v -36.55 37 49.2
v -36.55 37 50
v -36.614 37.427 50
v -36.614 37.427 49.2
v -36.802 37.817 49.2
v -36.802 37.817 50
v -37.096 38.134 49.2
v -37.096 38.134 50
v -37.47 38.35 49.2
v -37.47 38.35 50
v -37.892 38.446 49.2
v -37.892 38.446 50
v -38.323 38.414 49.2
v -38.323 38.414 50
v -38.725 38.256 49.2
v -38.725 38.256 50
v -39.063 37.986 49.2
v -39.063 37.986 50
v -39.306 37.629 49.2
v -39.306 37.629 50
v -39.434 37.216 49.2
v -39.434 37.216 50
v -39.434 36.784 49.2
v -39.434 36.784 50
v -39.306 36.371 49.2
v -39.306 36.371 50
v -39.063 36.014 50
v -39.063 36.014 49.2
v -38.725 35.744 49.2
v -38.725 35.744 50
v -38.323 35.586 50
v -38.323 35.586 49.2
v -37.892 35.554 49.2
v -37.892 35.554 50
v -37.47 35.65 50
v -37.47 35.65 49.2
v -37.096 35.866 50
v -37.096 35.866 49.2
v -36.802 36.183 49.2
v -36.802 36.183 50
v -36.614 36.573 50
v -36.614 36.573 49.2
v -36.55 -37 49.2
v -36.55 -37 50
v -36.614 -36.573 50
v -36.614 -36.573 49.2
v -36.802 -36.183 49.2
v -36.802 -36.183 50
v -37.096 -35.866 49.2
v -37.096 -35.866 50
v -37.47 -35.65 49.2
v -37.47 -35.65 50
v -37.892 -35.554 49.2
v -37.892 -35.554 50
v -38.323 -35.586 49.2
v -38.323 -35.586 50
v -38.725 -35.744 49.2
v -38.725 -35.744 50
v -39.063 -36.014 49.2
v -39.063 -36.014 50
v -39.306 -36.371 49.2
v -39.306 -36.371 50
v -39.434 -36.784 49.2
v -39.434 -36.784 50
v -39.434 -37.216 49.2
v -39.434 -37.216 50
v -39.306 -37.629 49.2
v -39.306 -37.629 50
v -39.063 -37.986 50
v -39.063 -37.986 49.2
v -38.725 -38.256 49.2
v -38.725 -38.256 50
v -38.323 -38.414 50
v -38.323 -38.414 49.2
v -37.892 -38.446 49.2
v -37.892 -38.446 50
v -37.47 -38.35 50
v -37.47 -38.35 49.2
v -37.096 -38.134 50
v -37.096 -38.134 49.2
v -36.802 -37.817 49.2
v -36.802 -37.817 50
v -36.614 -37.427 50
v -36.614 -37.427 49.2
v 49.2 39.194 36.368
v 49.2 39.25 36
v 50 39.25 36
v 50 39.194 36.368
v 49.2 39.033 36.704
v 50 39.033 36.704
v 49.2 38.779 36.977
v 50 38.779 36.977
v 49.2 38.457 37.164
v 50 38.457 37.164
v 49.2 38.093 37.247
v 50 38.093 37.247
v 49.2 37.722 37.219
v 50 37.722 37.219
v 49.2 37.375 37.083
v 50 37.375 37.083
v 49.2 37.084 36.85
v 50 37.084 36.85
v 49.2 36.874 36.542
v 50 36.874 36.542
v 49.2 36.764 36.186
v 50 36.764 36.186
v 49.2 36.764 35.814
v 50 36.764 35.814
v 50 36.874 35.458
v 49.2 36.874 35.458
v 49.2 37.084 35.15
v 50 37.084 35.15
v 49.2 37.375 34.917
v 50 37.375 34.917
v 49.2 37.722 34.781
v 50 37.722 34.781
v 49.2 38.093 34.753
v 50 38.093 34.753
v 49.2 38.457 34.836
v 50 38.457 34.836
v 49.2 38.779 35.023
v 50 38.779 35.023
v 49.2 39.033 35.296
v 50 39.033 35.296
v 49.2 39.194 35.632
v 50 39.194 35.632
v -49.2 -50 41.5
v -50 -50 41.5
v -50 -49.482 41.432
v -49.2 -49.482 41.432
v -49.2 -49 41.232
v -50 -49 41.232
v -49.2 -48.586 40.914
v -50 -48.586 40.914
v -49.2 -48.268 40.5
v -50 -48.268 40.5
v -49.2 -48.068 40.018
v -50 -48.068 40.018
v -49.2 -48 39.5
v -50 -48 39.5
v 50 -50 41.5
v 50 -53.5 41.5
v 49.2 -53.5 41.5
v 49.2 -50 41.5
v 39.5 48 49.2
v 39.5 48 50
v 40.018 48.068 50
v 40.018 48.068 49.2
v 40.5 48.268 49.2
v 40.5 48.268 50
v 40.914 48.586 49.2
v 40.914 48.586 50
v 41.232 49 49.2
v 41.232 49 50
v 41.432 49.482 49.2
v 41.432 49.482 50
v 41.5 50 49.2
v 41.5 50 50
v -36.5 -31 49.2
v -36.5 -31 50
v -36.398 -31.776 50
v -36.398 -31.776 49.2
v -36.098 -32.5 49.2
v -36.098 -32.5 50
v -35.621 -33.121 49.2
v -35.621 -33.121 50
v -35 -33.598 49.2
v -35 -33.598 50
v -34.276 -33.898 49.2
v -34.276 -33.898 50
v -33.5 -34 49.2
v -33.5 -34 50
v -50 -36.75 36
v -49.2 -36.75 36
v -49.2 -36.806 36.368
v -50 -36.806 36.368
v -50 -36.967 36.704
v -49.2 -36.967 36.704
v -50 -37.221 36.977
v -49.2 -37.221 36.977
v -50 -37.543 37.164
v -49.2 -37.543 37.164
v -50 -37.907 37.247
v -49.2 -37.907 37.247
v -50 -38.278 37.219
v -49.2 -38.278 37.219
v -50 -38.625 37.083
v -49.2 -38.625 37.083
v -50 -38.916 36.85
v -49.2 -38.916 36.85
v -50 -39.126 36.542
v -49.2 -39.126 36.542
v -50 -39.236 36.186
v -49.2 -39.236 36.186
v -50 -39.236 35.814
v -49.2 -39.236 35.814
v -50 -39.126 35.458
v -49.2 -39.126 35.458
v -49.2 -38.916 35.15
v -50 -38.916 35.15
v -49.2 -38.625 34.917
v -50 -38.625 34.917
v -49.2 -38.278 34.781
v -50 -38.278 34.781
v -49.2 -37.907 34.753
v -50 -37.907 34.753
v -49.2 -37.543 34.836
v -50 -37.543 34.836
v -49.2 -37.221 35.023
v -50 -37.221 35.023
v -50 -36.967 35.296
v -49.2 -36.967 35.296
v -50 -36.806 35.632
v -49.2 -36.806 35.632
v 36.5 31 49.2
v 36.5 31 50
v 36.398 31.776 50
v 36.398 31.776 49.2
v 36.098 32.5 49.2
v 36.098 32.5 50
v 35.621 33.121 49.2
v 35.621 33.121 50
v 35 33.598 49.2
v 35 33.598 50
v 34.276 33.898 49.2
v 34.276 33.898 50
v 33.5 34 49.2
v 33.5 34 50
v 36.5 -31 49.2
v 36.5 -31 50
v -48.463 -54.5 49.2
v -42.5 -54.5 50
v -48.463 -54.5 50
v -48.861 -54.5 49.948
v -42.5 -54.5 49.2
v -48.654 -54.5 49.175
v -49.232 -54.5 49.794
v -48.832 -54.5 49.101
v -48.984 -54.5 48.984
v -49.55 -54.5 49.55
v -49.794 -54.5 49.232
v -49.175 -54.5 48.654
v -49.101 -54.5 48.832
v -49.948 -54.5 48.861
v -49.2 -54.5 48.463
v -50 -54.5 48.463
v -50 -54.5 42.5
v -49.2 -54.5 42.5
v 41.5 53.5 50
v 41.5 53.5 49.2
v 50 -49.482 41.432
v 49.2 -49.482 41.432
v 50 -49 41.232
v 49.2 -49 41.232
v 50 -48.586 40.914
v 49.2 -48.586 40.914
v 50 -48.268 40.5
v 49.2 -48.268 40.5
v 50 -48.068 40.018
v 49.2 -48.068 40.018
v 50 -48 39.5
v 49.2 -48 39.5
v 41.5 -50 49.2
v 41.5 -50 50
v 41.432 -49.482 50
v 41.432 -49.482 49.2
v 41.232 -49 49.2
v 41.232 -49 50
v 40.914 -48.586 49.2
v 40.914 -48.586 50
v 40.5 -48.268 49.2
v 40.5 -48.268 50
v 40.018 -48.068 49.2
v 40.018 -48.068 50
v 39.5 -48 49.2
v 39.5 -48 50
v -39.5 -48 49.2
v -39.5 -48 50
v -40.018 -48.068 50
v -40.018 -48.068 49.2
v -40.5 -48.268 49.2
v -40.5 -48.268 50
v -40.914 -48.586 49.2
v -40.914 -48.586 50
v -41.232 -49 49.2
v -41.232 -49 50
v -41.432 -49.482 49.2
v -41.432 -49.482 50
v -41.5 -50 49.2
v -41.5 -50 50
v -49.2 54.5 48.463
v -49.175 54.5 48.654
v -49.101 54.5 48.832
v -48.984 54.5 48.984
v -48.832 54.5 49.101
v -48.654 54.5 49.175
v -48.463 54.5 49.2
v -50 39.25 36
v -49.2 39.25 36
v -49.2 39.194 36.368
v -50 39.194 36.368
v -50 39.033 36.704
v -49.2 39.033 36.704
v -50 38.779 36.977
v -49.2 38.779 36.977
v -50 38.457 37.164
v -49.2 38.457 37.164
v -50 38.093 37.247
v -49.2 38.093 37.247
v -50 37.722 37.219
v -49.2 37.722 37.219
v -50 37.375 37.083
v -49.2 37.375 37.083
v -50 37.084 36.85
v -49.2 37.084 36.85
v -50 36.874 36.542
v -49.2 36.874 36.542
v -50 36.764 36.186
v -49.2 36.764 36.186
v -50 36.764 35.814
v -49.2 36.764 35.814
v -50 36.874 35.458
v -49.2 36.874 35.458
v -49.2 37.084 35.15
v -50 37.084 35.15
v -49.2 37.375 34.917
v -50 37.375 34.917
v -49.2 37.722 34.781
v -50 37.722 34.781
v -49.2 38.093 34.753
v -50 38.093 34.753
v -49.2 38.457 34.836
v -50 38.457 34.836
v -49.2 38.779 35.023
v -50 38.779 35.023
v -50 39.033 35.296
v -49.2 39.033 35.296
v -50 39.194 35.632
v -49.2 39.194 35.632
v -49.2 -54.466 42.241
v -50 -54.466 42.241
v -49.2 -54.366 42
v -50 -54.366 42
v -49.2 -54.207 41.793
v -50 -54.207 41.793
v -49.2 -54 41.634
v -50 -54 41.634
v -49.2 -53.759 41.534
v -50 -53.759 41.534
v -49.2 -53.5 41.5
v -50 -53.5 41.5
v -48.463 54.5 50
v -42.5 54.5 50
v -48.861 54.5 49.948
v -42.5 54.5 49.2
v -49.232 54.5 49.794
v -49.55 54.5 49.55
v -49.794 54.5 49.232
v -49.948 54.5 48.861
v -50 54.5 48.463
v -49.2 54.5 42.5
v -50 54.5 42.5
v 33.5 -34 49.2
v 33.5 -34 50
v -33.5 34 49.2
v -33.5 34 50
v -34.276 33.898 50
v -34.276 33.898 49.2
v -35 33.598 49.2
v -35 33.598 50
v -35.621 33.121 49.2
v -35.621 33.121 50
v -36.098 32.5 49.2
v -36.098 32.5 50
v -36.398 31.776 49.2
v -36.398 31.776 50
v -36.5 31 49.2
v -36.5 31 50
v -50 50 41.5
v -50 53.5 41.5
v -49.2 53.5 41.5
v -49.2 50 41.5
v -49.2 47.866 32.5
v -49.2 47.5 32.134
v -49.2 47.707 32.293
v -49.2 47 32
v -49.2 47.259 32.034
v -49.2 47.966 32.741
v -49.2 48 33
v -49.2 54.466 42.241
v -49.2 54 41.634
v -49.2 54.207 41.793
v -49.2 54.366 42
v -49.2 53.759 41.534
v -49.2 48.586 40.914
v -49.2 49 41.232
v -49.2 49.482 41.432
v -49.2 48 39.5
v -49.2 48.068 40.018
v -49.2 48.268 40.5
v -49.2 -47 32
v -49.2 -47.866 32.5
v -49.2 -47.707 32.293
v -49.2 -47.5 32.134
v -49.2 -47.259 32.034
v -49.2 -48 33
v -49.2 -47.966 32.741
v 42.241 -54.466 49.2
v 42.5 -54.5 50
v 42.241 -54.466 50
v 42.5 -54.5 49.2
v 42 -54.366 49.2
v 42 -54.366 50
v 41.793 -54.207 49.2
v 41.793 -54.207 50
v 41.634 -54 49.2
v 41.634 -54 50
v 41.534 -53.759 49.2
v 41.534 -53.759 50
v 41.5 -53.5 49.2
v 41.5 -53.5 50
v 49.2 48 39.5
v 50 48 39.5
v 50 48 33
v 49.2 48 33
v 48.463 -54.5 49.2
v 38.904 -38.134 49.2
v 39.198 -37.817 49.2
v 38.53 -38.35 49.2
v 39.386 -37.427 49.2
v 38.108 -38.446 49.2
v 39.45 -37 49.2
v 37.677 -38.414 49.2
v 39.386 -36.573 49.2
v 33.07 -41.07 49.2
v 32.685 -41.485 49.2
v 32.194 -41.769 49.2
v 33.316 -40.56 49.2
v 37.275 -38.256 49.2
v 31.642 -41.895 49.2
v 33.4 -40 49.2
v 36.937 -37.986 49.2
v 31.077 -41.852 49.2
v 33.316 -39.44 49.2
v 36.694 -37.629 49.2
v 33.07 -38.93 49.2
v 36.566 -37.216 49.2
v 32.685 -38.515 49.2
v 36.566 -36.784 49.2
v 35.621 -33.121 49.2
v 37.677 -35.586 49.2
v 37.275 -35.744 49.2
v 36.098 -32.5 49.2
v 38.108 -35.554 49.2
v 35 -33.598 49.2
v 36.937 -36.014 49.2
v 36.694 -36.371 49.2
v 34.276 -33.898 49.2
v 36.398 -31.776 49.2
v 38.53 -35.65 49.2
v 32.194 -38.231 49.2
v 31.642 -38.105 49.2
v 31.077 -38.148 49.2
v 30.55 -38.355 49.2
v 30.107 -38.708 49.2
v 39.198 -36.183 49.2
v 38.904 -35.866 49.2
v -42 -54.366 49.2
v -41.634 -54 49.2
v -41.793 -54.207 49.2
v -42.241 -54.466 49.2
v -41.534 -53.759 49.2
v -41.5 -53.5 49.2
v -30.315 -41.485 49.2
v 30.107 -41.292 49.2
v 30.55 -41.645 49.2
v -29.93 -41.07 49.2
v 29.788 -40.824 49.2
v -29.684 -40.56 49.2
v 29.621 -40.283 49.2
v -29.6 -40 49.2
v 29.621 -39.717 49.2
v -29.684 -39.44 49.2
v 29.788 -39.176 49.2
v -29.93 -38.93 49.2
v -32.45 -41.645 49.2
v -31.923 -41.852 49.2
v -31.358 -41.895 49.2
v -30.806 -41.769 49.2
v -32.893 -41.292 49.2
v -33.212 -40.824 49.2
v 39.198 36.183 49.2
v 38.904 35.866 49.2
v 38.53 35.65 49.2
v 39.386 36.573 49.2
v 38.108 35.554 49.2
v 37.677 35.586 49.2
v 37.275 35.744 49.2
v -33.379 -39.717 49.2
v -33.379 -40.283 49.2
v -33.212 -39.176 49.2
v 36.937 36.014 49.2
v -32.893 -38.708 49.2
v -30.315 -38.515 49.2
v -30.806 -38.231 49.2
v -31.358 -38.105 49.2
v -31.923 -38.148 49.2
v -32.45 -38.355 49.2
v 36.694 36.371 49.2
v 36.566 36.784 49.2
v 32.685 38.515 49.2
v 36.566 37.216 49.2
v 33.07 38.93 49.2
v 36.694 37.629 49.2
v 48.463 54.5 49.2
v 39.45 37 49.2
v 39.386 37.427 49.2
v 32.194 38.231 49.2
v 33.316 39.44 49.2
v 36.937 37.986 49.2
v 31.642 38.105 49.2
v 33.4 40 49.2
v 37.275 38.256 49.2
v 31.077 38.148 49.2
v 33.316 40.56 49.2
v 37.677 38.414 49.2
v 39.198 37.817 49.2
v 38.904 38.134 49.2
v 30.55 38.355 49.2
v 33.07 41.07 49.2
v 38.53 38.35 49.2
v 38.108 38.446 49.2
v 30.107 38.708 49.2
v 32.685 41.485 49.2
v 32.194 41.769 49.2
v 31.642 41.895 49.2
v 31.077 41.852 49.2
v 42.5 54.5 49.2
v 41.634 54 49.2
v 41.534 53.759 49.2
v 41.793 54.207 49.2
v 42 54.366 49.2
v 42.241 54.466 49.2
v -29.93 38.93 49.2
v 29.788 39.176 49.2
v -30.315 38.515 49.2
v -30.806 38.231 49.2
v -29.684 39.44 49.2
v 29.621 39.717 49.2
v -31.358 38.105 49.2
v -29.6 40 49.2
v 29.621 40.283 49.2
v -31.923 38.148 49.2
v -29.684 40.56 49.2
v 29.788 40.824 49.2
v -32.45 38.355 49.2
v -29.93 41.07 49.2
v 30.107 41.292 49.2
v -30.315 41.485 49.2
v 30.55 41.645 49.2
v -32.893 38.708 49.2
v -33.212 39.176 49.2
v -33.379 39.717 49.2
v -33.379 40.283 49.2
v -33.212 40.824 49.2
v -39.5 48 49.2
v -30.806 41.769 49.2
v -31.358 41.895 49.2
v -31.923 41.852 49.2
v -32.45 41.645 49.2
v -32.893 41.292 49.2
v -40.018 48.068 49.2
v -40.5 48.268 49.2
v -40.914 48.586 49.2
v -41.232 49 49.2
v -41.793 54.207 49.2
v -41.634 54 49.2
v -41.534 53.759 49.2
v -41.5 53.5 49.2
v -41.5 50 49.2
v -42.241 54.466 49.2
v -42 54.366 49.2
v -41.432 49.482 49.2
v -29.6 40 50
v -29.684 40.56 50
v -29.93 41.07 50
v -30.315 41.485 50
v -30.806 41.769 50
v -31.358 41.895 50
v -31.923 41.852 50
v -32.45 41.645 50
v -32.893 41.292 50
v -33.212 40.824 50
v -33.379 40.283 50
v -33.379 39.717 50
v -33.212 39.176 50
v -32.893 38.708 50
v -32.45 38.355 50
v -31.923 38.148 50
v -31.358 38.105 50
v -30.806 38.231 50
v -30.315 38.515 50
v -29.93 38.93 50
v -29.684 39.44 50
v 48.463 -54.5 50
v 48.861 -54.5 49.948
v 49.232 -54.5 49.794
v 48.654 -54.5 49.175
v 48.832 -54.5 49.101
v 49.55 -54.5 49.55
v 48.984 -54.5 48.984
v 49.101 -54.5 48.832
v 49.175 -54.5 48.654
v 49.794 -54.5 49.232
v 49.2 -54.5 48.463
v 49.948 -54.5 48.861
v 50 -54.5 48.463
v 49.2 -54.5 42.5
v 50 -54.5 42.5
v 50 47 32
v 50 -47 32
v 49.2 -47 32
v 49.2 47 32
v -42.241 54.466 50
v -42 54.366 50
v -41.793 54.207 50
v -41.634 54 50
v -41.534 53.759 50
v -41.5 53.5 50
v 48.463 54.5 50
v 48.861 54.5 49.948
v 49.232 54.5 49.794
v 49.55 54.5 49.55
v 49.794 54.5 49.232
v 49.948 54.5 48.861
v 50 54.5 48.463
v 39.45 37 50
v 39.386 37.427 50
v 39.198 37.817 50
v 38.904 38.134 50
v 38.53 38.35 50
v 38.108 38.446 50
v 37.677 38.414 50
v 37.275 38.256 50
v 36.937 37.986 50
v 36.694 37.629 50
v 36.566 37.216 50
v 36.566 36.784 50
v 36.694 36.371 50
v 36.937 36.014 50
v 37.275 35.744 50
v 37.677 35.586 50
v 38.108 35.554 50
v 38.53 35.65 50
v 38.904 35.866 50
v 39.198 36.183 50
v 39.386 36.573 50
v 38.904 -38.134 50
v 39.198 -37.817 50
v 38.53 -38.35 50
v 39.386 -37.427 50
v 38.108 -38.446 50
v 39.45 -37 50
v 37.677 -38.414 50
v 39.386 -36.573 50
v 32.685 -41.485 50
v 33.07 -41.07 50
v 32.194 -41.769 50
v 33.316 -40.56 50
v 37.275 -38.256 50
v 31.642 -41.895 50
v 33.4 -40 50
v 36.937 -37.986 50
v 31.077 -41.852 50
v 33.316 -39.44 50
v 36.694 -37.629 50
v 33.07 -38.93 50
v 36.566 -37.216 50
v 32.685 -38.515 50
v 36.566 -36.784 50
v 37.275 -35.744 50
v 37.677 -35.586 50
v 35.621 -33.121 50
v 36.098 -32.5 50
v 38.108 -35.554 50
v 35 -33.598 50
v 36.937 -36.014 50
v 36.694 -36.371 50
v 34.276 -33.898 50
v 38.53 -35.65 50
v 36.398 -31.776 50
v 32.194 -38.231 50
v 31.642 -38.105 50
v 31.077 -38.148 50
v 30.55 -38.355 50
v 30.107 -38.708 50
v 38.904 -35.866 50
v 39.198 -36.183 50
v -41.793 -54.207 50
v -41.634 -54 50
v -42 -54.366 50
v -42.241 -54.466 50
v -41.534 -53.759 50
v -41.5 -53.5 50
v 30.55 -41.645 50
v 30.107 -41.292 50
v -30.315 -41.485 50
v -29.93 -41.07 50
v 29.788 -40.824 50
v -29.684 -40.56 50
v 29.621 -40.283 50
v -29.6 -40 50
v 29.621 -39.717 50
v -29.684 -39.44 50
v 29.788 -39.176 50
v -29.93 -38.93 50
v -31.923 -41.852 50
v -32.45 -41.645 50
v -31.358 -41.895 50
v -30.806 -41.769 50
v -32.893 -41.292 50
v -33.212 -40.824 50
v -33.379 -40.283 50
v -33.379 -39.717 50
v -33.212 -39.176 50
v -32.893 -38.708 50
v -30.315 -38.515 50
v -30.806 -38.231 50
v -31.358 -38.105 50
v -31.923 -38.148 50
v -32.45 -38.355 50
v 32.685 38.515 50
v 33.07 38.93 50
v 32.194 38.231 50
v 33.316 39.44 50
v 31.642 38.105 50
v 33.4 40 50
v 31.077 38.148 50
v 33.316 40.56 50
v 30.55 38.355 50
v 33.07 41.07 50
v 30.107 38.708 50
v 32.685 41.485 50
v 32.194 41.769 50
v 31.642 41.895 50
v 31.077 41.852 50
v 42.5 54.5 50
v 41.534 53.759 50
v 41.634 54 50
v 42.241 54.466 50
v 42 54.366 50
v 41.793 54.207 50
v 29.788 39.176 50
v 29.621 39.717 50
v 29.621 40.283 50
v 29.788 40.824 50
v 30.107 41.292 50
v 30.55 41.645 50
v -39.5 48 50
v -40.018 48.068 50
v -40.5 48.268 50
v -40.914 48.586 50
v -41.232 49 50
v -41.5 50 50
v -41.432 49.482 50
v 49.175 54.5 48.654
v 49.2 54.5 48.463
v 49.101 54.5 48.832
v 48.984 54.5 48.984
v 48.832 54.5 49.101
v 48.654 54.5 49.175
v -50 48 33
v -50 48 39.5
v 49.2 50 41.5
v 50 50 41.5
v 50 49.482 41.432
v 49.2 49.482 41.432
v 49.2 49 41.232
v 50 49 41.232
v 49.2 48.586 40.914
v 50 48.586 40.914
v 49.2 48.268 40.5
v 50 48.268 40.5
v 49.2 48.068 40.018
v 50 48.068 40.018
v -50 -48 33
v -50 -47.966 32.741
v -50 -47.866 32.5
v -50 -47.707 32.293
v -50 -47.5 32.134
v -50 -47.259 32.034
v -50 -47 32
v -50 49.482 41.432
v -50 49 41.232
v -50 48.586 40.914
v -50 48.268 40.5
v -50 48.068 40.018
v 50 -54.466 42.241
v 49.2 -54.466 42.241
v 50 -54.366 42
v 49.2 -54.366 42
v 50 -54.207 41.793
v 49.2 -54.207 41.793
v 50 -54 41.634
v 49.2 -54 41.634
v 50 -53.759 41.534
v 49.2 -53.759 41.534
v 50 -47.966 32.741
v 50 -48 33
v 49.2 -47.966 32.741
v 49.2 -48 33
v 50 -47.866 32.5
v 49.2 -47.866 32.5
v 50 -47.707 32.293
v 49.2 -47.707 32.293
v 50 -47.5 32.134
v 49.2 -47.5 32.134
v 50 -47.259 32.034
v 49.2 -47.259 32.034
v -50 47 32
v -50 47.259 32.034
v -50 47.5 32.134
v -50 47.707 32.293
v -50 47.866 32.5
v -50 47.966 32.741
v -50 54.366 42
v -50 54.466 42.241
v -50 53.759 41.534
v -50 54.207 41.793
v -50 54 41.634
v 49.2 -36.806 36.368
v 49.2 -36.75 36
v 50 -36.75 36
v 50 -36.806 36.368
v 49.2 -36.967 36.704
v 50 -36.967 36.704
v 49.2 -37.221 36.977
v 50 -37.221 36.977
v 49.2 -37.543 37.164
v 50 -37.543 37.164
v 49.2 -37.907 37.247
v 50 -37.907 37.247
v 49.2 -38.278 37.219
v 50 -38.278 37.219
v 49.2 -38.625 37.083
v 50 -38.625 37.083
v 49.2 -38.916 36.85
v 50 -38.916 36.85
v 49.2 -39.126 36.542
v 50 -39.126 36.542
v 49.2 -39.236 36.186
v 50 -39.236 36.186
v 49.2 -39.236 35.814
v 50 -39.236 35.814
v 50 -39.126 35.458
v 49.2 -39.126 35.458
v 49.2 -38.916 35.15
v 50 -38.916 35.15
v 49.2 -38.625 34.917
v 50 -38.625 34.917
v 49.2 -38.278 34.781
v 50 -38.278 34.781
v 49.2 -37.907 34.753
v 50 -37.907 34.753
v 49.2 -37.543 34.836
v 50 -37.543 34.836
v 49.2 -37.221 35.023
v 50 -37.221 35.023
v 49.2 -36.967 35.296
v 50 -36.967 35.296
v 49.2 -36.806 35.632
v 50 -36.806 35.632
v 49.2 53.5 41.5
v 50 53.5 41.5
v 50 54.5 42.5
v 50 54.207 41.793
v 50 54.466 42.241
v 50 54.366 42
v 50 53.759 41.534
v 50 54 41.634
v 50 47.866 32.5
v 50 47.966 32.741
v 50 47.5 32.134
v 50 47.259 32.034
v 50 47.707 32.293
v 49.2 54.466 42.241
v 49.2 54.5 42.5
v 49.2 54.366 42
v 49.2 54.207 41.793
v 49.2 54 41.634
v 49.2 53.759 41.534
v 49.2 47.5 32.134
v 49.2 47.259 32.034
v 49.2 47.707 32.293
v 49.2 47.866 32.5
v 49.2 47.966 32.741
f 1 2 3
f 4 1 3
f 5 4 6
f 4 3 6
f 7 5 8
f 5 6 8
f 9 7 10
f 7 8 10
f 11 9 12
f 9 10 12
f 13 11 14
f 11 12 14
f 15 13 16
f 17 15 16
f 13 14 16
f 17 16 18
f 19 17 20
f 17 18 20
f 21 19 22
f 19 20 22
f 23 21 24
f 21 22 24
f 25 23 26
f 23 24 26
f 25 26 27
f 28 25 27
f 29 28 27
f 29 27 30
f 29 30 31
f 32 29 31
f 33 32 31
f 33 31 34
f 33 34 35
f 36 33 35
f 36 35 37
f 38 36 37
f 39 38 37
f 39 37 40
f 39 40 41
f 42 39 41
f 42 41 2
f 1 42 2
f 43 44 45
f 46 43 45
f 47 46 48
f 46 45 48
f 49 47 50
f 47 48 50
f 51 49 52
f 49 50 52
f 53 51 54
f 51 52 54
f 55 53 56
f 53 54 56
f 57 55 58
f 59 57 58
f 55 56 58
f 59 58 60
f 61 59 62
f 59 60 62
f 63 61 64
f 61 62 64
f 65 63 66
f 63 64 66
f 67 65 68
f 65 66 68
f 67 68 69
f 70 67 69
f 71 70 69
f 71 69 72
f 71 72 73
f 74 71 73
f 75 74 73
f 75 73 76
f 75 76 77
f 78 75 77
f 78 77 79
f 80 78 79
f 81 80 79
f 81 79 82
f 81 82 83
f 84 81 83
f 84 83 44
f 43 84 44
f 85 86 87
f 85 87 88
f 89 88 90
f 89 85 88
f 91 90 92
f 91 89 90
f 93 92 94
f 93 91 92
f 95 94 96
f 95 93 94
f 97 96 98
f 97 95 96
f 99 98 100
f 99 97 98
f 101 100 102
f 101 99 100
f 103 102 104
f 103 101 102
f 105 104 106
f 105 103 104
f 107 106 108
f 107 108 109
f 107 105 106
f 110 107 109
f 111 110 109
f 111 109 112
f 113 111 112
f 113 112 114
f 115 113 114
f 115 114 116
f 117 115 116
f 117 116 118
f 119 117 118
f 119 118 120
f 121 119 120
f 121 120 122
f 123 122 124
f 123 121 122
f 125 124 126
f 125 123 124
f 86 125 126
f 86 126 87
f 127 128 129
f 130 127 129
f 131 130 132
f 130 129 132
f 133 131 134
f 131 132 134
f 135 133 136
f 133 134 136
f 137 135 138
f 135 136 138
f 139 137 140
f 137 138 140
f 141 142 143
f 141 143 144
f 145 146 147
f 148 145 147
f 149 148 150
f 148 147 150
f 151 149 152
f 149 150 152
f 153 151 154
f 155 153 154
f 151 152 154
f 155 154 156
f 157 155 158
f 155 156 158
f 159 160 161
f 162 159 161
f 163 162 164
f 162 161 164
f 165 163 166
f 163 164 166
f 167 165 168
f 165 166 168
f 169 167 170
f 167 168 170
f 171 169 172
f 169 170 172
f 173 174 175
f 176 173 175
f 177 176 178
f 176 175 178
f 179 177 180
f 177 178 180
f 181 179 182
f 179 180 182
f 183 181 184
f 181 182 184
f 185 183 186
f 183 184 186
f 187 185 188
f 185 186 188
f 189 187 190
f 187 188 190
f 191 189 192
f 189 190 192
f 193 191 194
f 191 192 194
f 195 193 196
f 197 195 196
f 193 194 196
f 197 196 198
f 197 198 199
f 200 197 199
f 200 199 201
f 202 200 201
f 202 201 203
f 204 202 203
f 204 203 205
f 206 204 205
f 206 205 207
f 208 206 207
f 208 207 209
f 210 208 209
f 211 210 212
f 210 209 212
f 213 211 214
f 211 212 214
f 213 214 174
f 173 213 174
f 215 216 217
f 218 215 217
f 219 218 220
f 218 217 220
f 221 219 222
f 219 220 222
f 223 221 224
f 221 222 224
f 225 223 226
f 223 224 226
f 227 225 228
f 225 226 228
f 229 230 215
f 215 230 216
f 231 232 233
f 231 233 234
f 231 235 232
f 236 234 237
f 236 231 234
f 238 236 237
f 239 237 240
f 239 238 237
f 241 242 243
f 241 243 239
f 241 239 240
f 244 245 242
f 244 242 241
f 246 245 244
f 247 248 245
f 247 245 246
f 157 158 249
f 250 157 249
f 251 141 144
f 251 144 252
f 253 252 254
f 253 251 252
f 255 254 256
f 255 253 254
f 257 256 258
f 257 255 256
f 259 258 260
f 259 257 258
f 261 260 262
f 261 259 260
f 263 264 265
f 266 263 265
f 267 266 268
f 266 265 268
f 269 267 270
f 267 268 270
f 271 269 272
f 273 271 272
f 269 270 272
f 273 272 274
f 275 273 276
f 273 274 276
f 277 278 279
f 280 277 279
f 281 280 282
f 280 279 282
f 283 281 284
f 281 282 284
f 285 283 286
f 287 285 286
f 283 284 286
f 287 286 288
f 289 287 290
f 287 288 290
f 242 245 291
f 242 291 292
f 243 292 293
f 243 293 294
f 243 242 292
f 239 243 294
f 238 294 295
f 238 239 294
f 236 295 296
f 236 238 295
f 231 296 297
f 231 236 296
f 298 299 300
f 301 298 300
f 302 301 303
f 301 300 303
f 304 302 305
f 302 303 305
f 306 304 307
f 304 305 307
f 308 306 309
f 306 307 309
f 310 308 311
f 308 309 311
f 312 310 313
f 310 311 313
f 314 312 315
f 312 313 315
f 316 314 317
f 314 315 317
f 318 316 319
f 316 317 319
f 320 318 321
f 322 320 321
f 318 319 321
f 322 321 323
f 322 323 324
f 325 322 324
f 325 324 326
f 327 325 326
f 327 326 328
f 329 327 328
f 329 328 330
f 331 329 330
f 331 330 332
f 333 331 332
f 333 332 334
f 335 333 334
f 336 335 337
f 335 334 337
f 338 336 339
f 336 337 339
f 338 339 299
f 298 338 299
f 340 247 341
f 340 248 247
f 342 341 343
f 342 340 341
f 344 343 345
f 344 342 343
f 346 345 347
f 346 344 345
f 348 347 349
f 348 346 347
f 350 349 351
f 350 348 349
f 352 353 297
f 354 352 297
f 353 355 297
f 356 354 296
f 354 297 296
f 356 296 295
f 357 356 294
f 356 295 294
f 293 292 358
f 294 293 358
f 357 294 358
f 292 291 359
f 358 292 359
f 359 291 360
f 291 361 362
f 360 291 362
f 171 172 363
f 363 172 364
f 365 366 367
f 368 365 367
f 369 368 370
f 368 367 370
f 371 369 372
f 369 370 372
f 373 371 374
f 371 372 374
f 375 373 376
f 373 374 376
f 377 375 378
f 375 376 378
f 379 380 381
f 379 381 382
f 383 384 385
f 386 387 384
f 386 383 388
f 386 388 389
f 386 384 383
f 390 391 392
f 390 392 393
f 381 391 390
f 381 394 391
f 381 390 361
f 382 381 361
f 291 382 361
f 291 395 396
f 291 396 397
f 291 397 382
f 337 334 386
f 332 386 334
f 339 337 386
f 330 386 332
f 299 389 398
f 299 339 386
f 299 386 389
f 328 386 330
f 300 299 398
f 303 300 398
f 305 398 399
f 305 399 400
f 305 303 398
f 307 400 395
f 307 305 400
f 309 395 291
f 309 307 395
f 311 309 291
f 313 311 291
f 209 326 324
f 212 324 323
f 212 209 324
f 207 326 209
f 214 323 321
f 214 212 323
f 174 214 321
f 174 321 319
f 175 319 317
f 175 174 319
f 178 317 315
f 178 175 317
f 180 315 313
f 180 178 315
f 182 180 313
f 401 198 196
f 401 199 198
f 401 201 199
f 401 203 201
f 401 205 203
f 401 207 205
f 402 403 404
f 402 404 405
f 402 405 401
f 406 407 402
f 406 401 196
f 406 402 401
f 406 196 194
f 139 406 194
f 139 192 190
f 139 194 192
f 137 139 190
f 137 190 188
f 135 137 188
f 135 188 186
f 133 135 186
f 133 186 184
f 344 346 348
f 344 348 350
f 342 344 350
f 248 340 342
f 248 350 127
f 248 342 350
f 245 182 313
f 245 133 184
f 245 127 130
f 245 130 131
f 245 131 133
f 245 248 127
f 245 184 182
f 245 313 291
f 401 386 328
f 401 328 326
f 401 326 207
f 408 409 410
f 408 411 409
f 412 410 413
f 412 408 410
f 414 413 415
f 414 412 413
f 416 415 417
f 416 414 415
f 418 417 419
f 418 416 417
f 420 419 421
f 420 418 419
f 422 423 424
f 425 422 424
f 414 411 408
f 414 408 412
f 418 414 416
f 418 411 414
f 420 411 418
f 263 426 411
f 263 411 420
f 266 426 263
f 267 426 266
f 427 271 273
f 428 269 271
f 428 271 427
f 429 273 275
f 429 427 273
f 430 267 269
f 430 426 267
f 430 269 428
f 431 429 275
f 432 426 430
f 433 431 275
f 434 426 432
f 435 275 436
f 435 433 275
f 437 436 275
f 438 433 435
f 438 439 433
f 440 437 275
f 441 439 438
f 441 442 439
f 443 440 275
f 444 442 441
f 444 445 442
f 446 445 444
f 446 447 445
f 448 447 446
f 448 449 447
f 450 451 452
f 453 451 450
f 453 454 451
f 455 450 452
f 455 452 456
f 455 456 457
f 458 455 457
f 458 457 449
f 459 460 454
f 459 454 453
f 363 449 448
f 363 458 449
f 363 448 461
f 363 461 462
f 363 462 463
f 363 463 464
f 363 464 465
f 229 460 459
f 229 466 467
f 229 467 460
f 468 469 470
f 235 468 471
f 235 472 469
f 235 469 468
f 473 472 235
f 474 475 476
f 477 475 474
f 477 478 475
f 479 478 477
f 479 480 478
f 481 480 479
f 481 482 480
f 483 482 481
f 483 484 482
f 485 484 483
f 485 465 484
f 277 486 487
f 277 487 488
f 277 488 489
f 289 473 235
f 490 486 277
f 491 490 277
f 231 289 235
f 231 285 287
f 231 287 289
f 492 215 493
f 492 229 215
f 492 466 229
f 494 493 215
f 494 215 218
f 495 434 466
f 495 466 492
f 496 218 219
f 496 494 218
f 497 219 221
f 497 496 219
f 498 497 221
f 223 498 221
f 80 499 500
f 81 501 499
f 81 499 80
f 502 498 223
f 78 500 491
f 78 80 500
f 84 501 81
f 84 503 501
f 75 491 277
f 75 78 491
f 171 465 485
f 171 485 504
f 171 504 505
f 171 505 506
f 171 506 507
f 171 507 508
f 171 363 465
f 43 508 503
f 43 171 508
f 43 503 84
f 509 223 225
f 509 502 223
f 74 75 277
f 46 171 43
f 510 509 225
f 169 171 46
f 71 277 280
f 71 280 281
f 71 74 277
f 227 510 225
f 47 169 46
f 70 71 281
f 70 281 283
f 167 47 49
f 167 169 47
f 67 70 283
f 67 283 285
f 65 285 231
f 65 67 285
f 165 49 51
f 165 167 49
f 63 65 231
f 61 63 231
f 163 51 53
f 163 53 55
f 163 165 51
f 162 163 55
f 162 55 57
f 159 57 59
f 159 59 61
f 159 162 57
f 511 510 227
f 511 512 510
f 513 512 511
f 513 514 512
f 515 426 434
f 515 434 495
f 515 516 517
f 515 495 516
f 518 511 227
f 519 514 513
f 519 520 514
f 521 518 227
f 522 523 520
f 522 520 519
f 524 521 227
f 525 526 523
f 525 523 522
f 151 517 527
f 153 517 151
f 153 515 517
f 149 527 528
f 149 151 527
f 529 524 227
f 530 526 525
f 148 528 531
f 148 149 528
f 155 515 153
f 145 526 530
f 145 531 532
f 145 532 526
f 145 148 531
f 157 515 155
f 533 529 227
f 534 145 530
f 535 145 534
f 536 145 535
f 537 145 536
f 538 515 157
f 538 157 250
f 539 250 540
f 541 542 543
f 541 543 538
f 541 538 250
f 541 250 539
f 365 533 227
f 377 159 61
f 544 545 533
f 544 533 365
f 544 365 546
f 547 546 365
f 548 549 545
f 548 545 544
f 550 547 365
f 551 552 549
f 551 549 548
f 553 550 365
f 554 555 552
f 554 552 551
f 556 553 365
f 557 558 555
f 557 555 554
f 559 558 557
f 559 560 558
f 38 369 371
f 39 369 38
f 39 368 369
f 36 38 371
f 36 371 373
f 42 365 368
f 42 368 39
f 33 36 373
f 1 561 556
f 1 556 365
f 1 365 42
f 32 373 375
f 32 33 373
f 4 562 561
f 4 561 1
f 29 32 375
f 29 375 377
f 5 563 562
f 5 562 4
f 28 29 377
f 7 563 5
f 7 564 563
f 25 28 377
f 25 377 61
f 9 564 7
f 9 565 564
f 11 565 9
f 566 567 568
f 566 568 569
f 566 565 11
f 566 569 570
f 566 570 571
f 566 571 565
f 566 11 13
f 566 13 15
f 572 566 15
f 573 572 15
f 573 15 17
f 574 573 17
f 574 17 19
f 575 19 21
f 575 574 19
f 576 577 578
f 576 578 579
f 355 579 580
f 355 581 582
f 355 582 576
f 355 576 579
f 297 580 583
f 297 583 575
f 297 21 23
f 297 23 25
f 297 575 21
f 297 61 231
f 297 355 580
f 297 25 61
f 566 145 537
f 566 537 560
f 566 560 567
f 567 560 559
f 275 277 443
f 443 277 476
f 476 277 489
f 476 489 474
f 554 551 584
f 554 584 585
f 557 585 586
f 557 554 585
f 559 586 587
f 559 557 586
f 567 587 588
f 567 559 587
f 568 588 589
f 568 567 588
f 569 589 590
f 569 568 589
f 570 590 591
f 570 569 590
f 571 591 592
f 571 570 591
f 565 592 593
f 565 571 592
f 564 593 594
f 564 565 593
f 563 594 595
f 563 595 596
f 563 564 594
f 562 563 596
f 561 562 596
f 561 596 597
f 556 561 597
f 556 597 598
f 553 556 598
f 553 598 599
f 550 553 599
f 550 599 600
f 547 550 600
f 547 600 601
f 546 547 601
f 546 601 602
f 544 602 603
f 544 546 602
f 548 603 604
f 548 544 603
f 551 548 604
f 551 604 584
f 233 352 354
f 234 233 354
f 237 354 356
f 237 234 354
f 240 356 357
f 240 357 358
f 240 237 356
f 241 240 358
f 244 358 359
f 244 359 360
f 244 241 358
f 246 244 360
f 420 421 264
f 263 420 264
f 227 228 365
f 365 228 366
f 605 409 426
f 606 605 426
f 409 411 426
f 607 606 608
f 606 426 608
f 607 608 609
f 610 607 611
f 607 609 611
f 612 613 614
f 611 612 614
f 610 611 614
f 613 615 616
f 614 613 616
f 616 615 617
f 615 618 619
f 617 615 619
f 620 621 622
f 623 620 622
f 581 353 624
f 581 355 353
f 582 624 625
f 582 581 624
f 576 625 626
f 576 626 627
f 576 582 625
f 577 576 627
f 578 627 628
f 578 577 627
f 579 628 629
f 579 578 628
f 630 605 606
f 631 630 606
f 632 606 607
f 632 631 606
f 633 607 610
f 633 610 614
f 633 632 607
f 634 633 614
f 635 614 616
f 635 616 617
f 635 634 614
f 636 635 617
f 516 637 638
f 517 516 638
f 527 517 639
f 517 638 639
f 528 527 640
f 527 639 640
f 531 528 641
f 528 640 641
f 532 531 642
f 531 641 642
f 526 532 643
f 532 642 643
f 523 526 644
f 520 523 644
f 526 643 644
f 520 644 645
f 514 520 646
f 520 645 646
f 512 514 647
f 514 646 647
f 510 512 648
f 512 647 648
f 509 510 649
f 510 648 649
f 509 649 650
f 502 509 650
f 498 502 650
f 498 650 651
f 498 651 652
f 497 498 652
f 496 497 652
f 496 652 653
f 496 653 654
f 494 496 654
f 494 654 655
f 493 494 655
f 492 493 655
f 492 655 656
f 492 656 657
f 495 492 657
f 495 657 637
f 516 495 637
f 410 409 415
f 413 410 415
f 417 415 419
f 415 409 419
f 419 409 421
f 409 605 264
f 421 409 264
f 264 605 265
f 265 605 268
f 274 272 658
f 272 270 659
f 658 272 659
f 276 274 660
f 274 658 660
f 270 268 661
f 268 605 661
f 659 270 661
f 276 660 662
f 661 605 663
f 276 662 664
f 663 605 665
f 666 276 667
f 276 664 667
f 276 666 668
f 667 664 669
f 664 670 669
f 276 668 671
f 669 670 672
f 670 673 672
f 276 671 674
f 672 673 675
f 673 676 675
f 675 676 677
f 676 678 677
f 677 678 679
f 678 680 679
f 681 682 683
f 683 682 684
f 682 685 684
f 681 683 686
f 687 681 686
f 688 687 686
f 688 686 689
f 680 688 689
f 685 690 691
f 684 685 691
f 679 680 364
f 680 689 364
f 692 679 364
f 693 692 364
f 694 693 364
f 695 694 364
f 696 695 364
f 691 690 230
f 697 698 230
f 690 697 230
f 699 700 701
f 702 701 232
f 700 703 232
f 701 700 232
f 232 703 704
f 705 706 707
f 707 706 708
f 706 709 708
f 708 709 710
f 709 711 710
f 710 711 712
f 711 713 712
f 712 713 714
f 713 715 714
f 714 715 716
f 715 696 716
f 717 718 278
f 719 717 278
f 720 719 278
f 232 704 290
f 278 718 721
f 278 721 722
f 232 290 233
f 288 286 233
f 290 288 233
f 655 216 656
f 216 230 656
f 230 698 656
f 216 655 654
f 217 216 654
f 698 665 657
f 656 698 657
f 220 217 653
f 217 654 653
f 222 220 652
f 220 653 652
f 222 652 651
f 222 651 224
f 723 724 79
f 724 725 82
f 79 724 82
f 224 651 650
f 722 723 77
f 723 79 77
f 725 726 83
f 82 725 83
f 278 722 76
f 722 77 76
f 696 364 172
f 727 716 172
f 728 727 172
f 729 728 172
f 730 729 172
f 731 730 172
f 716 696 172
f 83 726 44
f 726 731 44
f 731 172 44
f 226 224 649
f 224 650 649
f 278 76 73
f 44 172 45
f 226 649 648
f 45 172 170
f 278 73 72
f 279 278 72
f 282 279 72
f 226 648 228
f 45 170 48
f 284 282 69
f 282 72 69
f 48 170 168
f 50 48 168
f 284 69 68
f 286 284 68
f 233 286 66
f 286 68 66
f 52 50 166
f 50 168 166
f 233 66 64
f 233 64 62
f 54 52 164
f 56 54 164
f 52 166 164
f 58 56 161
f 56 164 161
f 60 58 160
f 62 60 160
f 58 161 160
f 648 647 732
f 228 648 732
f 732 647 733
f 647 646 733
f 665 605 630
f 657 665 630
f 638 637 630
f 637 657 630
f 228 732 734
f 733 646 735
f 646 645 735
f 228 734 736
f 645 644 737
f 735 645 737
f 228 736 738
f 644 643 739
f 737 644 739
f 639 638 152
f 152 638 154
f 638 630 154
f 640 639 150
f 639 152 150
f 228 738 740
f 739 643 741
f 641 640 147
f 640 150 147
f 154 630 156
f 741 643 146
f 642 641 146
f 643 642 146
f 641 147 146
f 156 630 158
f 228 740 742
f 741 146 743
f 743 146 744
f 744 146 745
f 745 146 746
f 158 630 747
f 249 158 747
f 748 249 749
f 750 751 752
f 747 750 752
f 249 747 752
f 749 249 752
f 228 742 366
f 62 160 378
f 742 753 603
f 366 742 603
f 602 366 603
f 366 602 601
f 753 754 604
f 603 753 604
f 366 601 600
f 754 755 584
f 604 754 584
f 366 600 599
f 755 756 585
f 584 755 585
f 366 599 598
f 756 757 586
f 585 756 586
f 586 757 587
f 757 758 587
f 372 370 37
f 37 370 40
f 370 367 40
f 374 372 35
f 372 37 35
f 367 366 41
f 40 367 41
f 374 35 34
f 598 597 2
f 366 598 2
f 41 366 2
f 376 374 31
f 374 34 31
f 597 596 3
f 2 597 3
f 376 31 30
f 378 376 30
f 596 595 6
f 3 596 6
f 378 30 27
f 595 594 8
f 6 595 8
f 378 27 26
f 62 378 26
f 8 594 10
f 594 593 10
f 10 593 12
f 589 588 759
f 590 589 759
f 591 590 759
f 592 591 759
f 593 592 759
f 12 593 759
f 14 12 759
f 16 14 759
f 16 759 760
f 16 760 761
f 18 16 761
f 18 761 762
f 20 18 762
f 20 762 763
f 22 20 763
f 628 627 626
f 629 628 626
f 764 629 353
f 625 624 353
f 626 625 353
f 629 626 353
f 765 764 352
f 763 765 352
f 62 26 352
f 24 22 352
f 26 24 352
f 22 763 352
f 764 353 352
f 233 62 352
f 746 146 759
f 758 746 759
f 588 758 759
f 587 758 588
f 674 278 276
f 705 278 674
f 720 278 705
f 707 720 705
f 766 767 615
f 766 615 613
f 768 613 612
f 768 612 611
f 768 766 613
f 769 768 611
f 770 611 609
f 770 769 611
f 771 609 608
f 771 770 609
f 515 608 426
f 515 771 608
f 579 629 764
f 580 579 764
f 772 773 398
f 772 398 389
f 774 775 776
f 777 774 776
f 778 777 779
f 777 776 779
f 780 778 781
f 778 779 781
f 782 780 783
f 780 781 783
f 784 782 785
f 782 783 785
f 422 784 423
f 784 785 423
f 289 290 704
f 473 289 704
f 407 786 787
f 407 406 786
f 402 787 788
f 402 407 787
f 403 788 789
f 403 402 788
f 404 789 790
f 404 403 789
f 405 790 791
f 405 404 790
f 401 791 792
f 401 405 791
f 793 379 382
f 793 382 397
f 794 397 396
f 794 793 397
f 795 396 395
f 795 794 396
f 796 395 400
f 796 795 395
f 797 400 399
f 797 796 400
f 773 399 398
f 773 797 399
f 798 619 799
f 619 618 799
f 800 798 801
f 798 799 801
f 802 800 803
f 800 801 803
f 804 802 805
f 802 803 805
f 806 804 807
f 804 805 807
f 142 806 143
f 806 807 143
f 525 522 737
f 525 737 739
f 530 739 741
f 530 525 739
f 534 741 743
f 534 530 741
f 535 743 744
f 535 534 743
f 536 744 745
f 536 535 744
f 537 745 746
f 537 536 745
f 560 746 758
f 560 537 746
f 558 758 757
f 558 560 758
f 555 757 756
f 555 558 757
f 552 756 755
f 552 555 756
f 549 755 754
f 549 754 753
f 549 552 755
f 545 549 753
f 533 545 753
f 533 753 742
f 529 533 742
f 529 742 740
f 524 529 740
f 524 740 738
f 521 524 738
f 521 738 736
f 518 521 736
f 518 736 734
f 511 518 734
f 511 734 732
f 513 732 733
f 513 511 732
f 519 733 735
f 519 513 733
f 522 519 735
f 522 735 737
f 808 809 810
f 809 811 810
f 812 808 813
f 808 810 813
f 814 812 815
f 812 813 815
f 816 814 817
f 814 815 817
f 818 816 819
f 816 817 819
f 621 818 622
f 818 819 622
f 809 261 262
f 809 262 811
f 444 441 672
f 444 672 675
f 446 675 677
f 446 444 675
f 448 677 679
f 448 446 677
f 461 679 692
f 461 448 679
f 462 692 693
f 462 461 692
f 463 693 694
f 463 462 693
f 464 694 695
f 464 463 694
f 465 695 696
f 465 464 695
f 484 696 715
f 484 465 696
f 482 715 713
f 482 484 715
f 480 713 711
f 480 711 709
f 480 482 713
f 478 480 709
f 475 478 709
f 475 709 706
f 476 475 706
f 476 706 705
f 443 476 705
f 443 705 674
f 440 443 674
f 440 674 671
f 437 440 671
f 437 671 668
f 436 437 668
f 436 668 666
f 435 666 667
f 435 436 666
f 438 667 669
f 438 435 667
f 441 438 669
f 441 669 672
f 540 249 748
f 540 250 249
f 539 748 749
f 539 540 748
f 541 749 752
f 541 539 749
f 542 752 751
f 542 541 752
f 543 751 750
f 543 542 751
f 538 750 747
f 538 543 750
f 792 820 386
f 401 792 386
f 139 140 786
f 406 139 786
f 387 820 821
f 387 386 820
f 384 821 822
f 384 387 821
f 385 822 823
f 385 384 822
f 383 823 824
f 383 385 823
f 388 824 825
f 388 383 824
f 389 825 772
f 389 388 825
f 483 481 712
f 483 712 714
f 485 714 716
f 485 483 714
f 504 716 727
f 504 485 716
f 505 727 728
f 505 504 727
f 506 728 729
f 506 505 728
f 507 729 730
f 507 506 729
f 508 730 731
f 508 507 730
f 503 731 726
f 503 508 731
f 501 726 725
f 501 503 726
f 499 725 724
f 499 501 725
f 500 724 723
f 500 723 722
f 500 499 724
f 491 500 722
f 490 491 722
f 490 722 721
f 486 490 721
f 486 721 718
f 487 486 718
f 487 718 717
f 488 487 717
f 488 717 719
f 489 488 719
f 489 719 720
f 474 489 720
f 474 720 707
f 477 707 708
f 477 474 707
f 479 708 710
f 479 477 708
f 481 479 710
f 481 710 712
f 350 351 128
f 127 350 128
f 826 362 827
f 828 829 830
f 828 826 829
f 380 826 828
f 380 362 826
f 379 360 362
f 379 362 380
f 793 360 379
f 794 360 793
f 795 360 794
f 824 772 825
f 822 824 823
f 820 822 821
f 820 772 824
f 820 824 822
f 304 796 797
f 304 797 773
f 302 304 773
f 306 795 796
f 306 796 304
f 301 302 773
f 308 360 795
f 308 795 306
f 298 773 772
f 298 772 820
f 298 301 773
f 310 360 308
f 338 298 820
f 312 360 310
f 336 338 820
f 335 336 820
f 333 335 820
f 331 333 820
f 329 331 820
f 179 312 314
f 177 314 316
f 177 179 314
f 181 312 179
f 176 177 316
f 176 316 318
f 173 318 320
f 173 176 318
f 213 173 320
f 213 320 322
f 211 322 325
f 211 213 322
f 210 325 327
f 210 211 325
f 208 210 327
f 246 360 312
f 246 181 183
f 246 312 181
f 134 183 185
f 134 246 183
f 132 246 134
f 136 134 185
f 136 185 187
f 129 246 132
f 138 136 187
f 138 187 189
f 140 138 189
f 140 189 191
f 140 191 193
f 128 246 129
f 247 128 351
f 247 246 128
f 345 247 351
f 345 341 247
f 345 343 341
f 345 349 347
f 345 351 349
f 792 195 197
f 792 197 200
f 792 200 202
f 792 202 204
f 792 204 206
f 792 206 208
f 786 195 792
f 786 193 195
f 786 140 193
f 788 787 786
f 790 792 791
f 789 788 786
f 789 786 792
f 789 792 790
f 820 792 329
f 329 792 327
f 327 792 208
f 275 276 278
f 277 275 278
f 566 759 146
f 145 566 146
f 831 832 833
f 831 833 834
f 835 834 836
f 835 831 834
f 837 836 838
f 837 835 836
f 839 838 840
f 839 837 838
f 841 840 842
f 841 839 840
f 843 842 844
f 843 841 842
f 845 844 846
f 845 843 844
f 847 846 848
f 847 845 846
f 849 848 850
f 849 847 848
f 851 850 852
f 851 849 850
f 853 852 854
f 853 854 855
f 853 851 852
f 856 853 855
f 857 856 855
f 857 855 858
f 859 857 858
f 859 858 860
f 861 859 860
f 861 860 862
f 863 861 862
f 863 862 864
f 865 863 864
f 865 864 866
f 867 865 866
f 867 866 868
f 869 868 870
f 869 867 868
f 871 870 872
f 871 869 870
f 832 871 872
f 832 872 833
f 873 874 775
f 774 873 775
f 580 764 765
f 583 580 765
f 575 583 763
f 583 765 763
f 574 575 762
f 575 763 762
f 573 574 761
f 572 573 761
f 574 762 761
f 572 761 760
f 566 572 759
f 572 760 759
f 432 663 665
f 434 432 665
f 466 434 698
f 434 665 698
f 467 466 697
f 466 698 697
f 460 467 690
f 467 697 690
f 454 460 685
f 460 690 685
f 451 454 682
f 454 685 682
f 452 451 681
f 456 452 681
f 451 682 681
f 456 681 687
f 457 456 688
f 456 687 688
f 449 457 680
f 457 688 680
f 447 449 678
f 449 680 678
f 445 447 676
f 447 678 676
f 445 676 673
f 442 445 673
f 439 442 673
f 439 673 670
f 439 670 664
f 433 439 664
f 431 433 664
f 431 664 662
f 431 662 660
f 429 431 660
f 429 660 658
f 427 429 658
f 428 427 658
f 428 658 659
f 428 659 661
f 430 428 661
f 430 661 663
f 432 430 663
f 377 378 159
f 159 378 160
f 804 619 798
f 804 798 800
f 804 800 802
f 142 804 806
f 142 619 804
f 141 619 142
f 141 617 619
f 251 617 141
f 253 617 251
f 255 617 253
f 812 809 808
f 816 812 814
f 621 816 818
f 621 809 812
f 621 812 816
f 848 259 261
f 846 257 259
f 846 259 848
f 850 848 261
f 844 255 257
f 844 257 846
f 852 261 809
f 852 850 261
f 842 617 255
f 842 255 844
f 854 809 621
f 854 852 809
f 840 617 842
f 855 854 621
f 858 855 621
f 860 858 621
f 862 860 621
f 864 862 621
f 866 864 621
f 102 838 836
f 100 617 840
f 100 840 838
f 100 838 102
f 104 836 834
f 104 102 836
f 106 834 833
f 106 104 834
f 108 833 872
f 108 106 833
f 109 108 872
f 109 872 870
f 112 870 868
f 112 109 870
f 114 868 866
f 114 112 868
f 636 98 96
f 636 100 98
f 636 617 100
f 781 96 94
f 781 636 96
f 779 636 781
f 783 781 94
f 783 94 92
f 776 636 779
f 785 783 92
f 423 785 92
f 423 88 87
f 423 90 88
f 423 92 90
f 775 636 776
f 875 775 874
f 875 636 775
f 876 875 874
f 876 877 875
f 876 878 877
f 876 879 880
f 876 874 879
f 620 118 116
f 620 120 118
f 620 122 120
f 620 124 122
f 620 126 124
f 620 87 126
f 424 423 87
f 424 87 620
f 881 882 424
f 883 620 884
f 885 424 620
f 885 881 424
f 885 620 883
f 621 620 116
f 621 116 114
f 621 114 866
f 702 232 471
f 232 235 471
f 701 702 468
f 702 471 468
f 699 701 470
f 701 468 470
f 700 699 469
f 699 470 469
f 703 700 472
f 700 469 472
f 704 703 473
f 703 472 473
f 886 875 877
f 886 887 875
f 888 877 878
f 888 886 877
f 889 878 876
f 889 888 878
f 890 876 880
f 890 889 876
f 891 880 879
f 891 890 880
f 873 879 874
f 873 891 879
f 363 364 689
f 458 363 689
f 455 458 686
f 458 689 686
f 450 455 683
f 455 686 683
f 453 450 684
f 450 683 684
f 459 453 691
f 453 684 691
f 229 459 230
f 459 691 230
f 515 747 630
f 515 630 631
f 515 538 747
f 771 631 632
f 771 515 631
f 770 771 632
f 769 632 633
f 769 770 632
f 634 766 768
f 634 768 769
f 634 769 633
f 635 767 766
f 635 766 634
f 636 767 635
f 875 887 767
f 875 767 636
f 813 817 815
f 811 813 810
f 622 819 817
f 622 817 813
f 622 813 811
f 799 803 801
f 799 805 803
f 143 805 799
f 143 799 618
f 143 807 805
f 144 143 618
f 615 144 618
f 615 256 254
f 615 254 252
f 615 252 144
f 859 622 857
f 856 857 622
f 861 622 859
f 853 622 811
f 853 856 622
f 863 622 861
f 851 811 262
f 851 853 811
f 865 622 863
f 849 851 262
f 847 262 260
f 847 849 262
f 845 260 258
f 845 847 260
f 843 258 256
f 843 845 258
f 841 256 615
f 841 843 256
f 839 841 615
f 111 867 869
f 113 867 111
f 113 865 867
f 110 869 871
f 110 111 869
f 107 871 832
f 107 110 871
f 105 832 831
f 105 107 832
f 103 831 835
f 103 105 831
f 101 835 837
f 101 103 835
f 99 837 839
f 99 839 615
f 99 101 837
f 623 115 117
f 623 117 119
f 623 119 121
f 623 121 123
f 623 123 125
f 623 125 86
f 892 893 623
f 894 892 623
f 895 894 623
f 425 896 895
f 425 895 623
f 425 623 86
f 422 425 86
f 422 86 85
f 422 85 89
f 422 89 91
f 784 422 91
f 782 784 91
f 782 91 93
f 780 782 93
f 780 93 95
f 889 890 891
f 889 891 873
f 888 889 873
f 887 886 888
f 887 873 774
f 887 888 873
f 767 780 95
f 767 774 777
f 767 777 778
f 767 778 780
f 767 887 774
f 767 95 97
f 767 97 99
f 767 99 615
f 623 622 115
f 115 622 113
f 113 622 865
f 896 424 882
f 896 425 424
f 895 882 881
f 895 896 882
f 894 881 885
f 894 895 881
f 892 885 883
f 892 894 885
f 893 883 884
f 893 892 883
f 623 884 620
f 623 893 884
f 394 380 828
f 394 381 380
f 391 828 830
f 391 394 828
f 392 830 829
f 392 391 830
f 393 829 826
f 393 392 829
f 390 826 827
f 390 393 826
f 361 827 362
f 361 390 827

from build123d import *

# Parameters (mm, degrees)
BASE_FLANGE1_DEPTH               = 0.8
EDGE_FLANGE1_STRIP_W             = 4.6732
EDGE_FLANGE1_STRIP_H             = 0.8
EDGE_FLANGE1_STRIP_CUT_DEPTH     = 109
EDGE_FLANGE1_DEPTH               = 109
EDGE_FLANGE2_STRIP_W             = 4.6732
EDGE_FLANGE2_STRIP_H             = 0.8
EDGE_FLANGE2_STRIP_CUT_DEPTH     = 109
EDGE_FLANGE2_DEPTH               = 109
MAIN_START                       = 49.2
MAIN_U_CONNECTORS_OUTLINE_R      = 1.25
MAIN_U_CONNECTORS_DEPTH          = 0.8
SOLAR_START                      = 49.2
SOLAR_PANEL_CONNECTORS_OUTLINE_R = 1.9
SOLAR_PANEL_CONNECTORS_DEPTH     = 0.8
CUT_EXTRUDE2_DEPTH               = 0.8
CUT_EXTRUDE3_DEPTH               = 10
SKETCH21_R                       = 1.45
CUT_EXTRUDE4_DEPTH               = 10
FILLET1_R                        = 1


# Read off the part's stored shape, not the designer's step: Main U Connectors, Solar Panel Connectors 
# Sheet-metal steps are written as plain solids
with BuildPart() as part:
    # Sketch1 → Base-Flange1 (new body)
    with BuildSketch(Plane.XY.offset(50)):
        with BuildLine():
            Line((-39.5, 48), (39.5, 48))
            ThreePointArc((39.5, 48), (40.914213562, 48.585786438), (41.5, 50))
            Line((41.5, 50), (41.5, 54.5))
            Line((41.5, 54.5), (50, 54.5))
            Line((50, 54.5), (50, 48))
            Line((50, 48), (50, -48))
            Line((50, -48), (50, -54.5))
            Line((50, -54.5), (41.5, -54.5))
            Line((41.5, -54.5), (41.5, -50))
            ThreePointArc((41.5, -50), (40.914213562, -48.585786438), (39.5, -48))
            Line((39.5, -48), (-39.5, -48))
            ThreePointArc((-39.5, -48), (-40.914213562, -48.585786438), (-41.5, -50))
            Line((-41.5, -50), (-41.5, -54.5))
            Line((-41.5, -54.5), (-50, -54.5))
            Line((-50, -54.5), (-50, -48))
            Line((-50, -48), (-50, 48))
            Line((-50, 48), (-50, 54.5))
            Line((-50, 54.5), (-41.5, 54.5))
            Line((-41.5, 54.5), (-41.5, 50))
            ThreePointArc((-41.5, 50), (-40.914213562, 48.585786438), (-39.5, 48))
        make_face()
    extrude(amount=-BASE_FLANGE1_DEPTH)

    # Edge-Flange1 strip (across the edge) → Edge-Flange1 strip cut (cut)
    with BuildSketch(Plane(origin=(50, 54.5, 49.2), x_dir=(-1, 0, 0), z_dir=(0, -1, 0))):
        with Locations((-0.8, -0.4)):
            Rectangle(EDGE_FLANGE1_STRIP_W, EDGE_FLANGE1_STRIP_H)
    extrude(amount=EDGE_FLANGE1_STRIP_CUT_DEPTH, mode=Mode.SUBTRACT)

    # Edge-Flange1 section (across the edge) → Edge-Flange1 (add)
    with BuildSketch(Plane(origin=(50, 54.5, 49.2), x_dir=(-1, 0, 0), z_dir=(0, -1, 0))):
        with BuildLine():
            Line((0, 0.7366), (0, 17.2))
            Line((0, 17.2), (0.8, 17.2))
            Line((0.8, 17.2), (0.8, 0.7366))
            ThreePointArc((0.8, 0.7366), (1.015745145, 0.215745145), (1.5366, 0))
            Line((1.5366, 0), (1.5366, -0.8))
            ThreePointArc((1.5366, -0.8), (0.45005972, -0.34994028), (0, 0.7366))
        make_face()
    extrude(amount=EDGE_FLANGE1_DEPTH)

    # Edge-Flange2 strip (across the edge) → Edge-Flange2 strip cut (cut)
    with BuildSketch(Plane(origin=(-50, -54.5, 49.2), x_dir=(1, 0, 0), z_dir=(0, 1, 0))):
        with Locations((-0.8, -0.4)):
            Rectangle(EDGE_FLANGE2_STRIP_W, EDGE_FLANGE2_STRIP_H)
    extrude(amount=EDGE_FLANGE2_STRIP_CUT_DEPTH, mode=Mode.SUBTRACT)

    # Edge-Flange2 section (across the edge) → Edge-Flange2 (add)
    with BuildSketch(Plane(origin=(-50, -54.5, 49.2), x_dir=(1, 0, 0), z_dir=(0, 1, 0))):
        with BuildLine():
            Line((0, 0.7366), (0, 17.2))
            Line((0, 17.2), (0.8, 17.2))
            Line((0.8, 17.2), (0.8, 0.7366))
            ThreePointArc((0.8, 0.7366), (1.015745145, 0.215745145), (1.5366, 0))
            Line((1.5366, 0), (1.5366, -0.8))
            ThreePointArc((1.5366, -0.8), (0.45005972, -0.34994028), (0, 0.7366))
        make_face()
    extrude(amount=EDGE_FLANGE2_DEPTH)

    # Main U Connectors outline → Main U Connectors (cut)
    with BuildSketch(Plane.YZ.offset(MAIN_START)):
        with Locations((-38, 36)):
            Circle(MAIN_U_CONNECTORS_OUTLINE_R)
        with Locations((38, 36)):
            Circle(MAIN_U_CONNECTORS_OUTLINE_R)
    main_u_connectors = extrude(amount=MAIN_U_CONNECTORS_DEPTH, mode=Mode.SUBTRACT)

    # Solar Panel Connectors outline → Solar Panel Connectors (cut)
    with BuildSketch(Plane.XY.offset(SOLAR_START)):
        with Locations((-31.5, 40)):
            Circle(SOLAR_PANEL_CONNECTORS_OUTLINE_R)
        with Locations((31.5, 40)):
            Circle(SOLAR_PANEL_CONNECTORS_OUTLINE_R)
        with Locations((31.5, -40)):
            Circle(SOLAR_PANEL_CONNECTORS_OUTLINE_R)
        with Locations((-31.5, -40)):
            Circle(SOLAR_PANEL_CONNECTORS_OUTLINE_R)
    extrude(amount=SOLAR_PANEL_CONNECTORS_DEPTH, mode=Mode.SUBTRACT)

    # Sketch18 → Cut-Extrude2 (cut)
    with BuildSketch(Plane.XY.offset(50)):
        with BuildLine():
            Line((-33.5, -34), (33.5, -34))
            ThreePointArc((33.5, -34), (35.621320344, -33.121320344), (36.5, -31))
            Line((36.5, -31), (36.5, 31))
            ThreePointArc((36.5, 31), (35.621320344, 33.121320344), (33.5, 34))
            Line((33.5, 34), (-33.5, 34))
            ThreePointArc((-33.5, 34), (-35.621320344, 33.121320344), (-36.5, 31))
            Line((-36.5, 31), (-36.5, -31))
            ThreePointArc((-36.5, -31), (-35.621320344, -33.121320344), (-33.5, -34))
        make_face()
    extrude(amount=-CUT_EXTRUDE2_DEPTH, mode=Mode.SUBTRACT)

    # Sketch19 → Cut-Extrude3 (cut)
    with BuildSketch(Plane(origin=(50, 0, 0), x_dir=(0, 0, -1), z_dir=(1, 0, 0))):
        with BuildLine():
            Line((-32, 54.5), (-41.5, 54.5))
            Line((-41.5, 54.5), (-41.5, 50))
            ThreePointArc((-41.5, 50), (-40.914213562, 48.585786438), (-39.5, 48))
            Line((-39.5, 48), (-32, 48))
            Line((-32, 48), (-32, 54.5))
        make_face()
        with BuildLine():
            Line((-41.5, -54.5), (-41.5, -50))
            ThreePointArc((-41.5, -50), (-40.914213562, -48.585786438), (-39.5, -48))
            Line((-39.5, -48), (-32, -48))
            Line((-32, -48), (-32, -54.5))
            Line((-32, -54.5), (-41.5, -54.5))
        make_face()
    cut_extrude3 = extrude(amount=-CUT_EXTRUDE3_DEPTH, mode=Mode.SUBTRACT)

    # Mirror1: Main U Connectors, Cut-Extrude3 across plane
    add(main_u_connectors.mirror(Plane(origin=(0, 0, 0), x_dir=(0, 0, 1), z_dir=(1, 0, 0))), mode=Mode.SUBTRACT)
    add(cut_extrude3.mirror(Plane(origin=(0, 0, 0), x_dir=(0, 0, 1), z_dir=(1, 0, 0))), mode=Mode.SUBTRACT)

    # Sketch21 → Cut-Extrude4 (cut)
    with BuildSketch(Plane.XY.offset(50)):
        with Locations((-38, 37)):
            Circle(SKETCH21_R)
        with Locations((38, 37)):
            Circle(SKETCH21_R)
        with Locations((38, -37)):
            Circle(SKETCH21_R)
        with Locations((-38, -37)):
            Circle(SKETCH21_R)
    extrude(amount=-CUT_EXTRUDE4_DEPTH, mode=Mode.SUBTRACT)

    # Fillet1
    fillet1_edges = [part.edges().sort_by_distance(p)[0] for p in [
        (49.6, 48, 32),
        (49.6, 54.5, 41.5),
        (49.6, -48, 32),
        (49.6, -54.5, 41.5),
        (-49.6, 48, 32),
        (-49.6, 54.5, 41.5),
        (-49.6, -54.5, 41.5),
        (-49.6, -48, 32),
        (-41.5, 54.5, 49.6),
        (41.5, 54.5, 49.6),
        (41.5, -54.5, 49.6),
        (-41.5, -54.5, 49.6),
    ]]
    fillet(fillet1_edges, radius=FILLET1_R)


solid = part.part
